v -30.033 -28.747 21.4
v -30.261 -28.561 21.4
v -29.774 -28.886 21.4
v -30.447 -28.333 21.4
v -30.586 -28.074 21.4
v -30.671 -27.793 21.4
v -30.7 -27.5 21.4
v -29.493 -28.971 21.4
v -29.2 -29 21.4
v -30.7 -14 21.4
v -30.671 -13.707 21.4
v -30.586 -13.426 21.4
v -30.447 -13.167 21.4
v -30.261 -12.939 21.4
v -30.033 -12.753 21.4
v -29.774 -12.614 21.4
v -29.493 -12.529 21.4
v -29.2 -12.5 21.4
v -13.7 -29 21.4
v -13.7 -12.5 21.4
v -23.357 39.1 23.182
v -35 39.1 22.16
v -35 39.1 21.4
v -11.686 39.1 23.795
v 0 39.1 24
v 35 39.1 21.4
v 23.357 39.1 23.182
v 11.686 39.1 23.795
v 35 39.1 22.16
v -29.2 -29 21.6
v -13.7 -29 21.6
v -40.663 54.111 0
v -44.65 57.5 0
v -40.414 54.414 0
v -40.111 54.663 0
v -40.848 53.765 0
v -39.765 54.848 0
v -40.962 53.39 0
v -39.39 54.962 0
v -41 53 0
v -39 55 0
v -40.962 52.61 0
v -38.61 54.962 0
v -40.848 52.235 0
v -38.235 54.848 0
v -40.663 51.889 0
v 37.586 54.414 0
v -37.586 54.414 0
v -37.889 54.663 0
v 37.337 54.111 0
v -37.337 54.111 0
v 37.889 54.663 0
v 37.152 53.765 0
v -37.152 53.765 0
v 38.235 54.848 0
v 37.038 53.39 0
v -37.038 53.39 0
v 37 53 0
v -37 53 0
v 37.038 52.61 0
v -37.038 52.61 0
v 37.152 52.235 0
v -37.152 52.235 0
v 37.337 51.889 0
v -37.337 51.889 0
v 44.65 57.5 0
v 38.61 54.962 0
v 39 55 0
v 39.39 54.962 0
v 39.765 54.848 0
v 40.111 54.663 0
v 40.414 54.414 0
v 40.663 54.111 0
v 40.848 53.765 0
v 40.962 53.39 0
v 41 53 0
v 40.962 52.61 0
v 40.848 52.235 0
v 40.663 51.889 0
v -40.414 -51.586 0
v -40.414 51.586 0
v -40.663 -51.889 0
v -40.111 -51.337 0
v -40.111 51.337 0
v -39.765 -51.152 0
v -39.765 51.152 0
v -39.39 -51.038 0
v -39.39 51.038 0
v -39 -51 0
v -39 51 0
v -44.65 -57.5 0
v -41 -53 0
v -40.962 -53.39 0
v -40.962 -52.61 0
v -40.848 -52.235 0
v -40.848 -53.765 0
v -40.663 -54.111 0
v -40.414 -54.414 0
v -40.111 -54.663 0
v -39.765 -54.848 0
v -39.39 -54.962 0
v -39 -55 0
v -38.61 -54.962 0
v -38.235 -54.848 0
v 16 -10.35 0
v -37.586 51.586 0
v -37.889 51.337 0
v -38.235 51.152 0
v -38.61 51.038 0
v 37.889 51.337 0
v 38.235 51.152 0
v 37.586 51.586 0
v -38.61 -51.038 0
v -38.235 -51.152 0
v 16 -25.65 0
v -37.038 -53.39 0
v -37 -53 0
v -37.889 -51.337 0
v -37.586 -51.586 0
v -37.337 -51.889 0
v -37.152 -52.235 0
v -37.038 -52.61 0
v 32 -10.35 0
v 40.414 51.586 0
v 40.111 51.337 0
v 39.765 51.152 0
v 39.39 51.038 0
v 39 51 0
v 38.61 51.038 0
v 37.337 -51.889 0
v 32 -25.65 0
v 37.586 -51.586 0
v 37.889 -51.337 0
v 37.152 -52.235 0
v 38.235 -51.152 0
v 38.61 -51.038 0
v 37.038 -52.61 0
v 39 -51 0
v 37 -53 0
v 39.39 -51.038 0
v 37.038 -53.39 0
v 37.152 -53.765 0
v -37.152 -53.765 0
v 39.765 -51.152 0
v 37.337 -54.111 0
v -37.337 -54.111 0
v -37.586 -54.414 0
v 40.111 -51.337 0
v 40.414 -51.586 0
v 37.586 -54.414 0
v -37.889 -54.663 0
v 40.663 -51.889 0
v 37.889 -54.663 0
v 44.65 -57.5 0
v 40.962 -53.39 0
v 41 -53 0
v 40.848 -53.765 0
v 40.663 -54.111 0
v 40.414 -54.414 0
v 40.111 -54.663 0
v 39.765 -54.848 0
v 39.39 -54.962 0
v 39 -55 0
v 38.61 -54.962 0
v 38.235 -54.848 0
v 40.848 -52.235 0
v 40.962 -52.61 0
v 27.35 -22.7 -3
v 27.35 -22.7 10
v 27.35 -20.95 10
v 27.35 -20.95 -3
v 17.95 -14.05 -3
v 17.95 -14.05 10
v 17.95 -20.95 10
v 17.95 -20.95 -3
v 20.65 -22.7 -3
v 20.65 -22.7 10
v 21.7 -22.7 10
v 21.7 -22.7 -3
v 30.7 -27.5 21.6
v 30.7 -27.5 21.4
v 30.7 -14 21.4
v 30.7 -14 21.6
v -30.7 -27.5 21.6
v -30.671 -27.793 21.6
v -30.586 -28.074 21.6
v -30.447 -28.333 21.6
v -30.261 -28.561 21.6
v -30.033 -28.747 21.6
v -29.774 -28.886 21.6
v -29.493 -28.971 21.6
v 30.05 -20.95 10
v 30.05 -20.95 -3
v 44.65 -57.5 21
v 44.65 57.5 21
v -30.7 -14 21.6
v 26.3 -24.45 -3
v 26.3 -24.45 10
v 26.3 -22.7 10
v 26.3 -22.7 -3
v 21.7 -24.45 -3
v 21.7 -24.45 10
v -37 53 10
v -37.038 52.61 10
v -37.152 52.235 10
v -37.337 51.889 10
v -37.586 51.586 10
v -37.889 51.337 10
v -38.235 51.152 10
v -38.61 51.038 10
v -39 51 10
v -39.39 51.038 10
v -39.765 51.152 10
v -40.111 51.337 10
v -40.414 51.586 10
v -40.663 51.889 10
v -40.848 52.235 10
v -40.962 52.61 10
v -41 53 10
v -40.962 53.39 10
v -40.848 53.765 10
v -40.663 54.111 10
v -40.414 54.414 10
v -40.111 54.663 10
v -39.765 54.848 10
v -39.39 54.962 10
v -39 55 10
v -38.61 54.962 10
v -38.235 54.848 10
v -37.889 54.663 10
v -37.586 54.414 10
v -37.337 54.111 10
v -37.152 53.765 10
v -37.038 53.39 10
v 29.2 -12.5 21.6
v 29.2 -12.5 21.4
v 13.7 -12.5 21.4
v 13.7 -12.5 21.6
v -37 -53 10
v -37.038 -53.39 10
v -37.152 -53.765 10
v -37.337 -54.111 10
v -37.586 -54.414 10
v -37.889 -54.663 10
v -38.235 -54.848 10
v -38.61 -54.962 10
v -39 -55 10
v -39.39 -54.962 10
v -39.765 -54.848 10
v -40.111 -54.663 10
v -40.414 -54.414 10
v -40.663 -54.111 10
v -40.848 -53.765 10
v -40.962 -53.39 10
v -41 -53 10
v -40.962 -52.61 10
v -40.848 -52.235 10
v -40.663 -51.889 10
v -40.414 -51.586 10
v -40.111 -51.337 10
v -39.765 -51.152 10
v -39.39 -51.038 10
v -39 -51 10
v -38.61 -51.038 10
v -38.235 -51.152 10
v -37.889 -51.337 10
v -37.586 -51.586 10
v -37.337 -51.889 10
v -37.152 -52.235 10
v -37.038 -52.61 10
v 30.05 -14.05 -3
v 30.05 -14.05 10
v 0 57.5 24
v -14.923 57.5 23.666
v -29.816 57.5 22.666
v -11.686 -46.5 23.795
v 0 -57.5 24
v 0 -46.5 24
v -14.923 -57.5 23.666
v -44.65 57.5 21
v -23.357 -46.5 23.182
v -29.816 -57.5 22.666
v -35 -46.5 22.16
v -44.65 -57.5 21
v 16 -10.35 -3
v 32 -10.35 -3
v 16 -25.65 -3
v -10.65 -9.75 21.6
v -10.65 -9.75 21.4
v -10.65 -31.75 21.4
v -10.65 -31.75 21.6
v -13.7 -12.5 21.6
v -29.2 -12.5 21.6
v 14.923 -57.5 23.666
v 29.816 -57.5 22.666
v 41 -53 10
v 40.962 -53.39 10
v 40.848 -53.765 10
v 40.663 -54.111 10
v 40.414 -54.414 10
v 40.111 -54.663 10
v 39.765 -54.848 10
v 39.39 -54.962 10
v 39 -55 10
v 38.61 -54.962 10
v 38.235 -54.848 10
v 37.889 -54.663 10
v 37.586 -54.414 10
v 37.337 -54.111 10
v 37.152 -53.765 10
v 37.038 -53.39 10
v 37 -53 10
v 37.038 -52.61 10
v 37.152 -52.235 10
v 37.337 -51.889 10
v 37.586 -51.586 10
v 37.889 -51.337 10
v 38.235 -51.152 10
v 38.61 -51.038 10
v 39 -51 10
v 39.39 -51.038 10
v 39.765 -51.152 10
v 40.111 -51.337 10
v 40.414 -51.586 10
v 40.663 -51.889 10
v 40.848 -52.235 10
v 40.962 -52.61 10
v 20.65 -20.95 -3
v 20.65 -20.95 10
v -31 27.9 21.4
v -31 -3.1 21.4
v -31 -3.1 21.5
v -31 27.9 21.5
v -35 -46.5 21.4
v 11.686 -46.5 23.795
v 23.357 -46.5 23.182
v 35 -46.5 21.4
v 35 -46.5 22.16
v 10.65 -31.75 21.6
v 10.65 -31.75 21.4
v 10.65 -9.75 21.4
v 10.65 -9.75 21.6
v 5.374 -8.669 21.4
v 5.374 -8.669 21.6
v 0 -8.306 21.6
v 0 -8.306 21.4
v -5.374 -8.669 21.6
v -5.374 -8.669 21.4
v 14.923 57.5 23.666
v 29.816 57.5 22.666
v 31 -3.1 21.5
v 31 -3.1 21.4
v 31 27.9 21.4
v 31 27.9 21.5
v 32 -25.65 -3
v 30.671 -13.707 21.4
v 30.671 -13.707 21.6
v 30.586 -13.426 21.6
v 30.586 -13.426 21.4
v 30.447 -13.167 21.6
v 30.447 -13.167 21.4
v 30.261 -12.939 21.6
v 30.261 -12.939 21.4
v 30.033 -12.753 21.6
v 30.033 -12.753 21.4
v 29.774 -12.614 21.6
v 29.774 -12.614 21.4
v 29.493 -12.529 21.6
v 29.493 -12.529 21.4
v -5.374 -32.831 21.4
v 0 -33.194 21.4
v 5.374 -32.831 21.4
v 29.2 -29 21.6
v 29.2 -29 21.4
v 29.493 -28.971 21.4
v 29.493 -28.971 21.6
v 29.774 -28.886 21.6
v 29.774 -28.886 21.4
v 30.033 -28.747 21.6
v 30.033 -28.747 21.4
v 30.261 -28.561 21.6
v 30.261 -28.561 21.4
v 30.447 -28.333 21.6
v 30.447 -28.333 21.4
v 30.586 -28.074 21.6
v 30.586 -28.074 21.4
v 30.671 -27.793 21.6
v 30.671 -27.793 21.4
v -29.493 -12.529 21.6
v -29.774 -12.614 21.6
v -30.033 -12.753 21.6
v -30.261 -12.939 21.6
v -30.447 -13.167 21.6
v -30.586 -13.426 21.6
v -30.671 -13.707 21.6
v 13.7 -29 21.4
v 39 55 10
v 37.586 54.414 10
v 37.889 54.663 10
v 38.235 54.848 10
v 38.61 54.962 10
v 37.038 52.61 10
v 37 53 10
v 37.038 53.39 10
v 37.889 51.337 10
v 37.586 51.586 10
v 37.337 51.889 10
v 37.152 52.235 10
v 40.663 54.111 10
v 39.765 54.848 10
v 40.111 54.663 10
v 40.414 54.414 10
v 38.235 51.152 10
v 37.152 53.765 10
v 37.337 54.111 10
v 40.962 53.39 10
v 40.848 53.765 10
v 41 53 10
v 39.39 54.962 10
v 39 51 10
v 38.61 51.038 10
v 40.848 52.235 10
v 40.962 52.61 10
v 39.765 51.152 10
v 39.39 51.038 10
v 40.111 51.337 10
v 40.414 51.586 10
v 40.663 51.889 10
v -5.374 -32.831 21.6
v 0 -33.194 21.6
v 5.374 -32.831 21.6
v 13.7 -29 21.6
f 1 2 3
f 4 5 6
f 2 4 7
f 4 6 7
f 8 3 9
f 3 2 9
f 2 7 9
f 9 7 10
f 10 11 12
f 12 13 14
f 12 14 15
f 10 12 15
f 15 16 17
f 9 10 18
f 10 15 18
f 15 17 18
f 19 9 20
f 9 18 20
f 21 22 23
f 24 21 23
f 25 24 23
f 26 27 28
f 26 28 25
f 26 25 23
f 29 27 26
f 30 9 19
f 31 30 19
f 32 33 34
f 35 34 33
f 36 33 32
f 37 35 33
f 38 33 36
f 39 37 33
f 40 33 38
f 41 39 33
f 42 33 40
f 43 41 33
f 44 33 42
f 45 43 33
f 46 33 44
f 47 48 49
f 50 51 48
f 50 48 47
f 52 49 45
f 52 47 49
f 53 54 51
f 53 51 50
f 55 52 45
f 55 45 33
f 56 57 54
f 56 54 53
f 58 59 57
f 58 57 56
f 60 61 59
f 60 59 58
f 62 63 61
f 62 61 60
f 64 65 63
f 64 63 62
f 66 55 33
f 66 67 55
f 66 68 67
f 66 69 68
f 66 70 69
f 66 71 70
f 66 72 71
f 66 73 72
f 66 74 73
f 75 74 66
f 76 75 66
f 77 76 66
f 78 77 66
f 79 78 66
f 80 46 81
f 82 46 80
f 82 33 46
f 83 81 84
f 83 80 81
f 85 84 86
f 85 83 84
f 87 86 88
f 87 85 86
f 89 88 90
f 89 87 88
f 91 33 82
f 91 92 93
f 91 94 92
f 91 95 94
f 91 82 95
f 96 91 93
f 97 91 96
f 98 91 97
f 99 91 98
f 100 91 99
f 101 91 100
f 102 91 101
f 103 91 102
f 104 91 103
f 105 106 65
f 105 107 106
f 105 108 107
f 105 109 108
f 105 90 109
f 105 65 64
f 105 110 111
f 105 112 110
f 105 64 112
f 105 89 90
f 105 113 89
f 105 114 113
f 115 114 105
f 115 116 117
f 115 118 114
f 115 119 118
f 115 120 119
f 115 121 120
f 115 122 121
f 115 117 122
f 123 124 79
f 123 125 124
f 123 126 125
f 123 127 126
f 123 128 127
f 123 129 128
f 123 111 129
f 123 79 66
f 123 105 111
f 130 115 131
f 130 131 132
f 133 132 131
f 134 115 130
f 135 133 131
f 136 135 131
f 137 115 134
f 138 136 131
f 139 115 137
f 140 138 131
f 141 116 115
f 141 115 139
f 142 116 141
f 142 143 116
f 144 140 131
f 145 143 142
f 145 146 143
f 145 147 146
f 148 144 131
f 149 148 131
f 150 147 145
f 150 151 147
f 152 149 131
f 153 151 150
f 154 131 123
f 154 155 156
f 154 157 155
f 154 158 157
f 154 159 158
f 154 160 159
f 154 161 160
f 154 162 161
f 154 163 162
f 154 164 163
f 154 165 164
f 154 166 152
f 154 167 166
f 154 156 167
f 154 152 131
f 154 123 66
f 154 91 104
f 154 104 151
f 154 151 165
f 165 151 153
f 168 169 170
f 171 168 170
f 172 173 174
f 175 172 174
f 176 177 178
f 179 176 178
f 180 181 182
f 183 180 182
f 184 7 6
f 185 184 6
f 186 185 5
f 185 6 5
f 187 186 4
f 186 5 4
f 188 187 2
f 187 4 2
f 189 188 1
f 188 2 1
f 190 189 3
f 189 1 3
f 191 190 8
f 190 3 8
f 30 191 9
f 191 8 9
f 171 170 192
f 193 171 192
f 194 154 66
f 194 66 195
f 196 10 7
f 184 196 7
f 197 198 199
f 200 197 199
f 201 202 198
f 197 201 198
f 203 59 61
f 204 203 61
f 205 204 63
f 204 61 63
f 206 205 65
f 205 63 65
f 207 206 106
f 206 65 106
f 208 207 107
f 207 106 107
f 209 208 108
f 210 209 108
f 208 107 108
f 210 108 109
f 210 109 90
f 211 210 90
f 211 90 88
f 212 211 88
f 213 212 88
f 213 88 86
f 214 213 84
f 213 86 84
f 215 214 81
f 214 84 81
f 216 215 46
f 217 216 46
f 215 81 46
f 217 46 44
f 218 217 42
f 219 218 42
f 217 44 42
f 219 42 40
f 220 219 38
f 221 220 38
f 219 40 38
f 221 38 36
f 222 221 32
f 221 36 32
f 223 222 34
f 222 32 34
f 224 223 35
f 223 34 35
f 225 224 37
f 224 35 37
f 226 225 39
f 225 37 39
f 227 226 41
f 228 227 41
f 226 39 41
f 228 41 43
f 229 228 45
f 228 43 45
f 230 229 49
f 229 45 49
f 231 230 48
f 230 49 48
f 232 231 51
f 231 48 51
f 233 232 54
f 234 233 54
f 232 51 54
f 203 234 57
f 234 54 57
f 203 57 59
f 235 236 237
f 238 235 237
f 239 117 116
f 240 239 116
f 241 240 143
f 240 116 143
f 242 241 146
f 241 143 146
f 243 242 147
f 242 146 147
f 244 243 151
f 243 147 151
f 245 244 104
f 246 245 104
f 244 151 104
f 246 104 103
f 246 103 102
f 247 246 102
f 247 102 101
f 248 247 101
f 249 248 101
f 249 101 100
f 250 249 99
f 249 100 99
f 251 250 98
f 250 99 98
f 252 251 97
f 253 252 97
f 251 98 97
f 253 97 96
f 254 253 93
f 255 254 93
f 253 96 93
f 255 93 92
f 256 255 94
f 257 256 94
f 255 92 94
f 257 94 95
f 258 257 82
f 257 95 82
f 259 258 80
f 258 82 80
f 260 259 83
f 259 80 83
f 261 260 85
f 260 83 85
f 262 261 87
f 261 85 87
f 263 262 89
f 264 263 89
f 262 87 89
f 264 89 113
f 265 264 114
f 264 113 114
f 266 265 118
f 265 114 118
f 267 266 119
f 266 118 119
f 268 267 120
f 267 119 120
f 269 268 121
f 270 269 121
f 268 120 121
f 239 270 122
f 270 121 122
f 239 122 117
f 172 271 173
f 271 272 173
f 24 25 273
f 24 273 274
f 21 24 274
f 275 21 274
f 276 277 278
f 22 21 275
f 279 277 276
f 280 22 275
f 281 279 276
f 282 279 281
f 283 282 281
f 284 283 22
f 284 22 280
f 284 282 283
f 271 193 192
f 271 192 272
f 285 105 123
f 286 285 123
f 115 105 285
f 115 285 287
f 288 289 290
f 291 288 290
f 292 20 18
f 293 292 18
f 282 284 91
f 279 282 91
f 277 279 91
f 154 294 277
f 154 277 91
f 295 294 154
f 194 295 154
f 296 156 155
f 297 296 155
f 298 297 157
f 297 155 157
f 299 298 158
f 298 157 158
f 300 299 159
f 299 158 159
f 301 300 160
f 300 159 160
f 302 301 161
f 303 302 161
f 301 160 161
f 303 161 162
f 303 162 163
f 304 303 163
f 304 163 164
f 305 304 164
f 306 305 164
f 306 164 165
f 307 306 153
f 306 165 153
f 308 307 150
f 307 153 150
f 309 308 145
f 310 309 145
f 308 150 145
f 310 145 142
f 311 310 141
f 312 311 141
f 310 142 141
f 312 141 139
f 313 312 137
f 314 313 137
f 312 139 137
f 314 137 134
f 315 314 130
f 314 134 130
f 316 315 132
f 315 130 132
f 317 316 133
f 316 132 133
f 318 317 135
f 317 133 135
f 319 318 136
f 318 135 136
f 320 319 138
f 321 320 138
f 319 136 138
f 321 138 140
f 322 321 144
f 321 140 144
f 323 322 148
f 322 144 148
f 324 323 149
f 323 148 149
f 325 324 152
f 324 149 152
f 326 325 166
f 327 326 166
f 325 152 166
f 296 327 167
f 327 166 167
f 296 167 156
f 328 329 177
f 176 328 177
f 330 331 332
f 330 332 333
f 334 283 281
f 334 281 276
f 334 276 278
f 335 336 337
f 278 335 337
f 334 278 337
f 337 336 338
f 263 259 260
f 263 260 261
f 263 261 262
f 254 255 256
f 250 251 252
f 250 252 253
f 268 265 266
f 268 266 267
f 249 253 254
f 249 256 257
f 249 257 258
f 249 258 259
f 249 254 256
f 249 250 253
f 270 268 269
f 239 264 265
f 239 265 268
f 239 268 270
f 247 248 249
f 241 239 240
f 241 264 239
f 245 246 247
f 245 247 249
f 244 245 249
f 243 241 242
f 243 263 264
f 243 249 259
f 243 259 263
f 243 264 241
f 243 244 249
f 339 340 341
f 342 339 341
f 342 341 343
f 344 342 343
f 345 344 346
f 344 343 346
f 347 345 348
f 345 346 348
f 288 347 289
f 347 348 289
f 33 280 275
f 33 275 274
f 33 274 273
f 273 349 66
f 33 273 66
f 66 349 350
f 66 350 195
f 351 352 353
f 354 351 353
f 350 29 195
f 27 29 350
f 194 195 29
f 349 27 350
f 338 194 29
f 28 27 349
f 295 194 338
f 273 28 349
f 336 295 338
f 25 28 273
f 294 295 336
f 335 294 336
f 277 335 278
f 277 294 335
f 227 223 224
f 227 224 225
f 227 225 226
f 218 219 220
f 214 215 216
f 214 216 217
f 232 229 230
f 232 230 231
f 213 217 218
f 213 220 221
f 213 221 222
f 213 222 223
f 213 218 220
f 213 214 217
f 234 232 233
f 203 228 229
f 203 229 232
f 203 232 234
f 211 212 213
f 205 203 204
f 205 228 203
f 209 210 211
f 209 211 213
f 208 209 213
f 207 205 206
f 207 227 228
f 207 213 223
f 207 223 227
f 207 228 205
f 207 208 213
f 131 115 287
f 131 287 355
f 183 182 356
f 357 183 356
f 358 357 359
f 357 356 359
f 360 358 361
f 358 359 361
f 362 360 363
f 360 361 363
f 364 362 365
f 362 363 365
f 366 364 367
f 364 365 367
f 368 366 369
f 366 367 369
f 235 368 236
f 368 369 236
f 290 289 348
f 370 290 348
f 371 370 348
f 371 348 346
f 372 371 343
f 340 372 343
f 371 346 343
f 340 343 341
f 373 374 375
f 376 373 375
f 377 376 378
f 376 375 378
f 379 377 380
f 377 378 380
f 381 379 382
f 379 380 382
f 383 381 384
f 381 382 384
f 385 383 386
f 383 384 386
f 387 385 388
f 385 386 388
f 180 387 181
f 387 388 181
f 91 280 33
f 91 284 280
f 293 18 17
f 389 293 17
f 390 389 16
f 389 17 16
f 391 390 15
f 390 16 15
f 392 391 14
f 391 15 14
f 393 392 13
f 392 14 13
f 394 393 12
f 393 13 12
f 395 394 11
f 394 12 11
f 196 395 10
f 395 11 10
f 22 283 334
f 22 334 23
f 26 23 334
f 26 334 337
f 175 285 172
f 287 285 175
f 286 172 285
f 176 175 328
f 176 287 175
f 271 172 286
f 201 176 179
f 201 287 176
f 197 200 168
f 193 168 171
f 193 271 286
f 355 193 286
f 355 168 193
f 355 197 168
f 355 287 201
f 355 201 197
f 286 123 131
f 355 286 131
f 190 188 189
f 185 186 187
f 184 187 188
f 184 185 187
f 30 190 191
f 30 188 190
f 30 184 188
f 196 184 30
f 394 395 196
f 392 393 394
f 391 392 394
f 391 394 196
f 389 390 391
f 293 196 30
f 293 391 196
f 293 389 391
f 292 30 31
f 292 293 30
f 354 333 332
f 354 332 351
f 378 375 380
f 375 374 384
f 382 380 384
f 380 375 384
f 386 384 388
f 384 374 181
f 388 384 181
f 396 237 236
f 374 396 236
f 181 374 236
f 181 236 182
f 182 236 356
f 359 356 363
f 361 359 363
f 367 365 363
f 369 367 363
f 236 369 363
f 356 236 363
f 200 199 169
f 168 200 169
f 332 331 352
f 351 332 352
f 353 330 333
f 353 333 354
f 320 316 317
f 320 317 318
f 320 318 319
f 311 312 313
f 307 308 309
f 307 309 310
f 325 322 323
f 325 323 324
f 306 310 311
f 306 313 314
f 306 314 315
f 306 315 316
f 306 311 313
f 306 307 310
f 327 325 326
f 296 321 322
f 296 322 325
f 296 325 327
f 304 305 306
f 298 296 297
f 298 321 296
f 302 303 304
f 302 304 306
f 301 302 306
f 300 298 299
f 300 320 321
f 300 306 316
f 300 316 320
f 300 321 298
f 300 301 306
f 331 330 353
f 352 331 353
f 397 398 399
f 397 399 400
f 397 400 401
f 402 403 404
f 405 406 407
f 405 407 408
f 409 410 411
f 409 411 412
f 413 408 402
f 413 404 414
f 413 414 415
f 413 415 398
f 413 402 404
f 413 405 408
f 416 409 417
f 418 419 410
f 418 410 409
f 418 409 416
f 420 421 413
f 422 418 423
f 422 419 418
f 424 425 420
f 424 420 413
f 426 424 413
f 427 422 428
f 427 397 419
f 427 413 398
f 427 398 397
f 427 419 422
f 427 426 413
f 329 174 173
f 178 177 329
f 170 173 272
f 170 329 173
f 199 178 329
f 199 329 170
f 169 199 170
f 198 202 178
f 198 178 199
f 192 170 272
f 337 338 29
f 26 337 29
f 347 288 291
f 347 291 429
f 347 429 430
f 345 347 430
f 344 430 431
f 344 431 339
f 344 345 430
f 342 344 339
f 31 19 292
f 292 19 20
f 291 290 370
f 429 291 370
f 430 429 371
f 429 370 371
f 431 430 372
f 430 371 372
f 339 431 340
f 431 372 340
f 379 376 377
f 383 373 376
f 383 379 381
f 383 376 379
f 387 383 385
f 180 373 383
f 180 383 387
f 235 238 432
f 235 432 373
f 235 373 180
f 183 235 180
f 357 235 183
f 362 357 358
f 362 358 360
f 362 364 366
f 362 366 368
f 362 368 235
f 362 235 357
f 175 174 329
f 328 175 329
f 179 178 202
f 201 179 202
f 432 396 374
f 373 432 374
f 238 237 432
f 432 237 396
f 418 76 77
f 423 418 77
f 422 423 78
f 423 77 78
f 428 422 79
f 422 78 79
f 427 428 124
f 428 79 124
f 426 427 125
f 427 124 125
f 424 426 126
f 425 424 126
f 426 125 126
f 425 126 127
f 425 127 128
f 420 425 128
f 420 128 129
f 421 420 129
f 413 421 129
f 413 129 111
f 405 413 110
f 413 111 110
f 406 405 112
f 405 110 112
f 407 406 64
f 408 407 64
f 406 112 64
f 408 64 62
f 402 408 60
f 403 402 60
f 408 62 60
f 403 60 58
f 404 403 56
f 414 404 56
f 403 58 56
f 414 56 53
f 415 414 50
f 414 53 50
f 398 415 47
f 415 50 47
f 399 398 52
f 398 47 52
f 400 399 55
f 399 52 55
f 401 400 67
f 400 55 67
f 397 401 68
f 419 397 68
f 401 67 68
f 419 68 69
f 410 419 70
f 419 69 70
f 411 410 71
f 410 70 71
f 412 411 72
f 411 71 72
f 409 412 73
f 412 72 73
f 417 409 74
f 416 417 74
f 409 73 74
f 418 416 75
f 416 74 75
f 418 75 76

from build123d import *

# Parameters (mm, degrees)
F1_DEPTH  = 57.5
F2_W      = 16
F2_H      = 15.3
F3_DEPTH  = 3
F2_R      = 2
F4_DEPTH  = 10
F6_W      = 70
F6_H      = 85.6
F7_DEPTH  = 2.6
F8_W      = 62
F8_H      = 31
F9_DEPTH  = 0.1
F10_DEPTH = 0.2


with BuildPart() as f1:
    # F0 (on Front) → F1 (new body, symmetric)
    with BuildSketch(Plane.XZ):
        with BuildLine():
            Line((-44.65, 0), (0, 0))
            Line((0, 0), (0, 24))
            ThreePointArc((0, 24), (-22.375335, 23.249155), (-44.65, 21))
            Line((-44.65, 21), (-44.65, 0))
        make_face()
        with BuildLine():
            Line((0, 24), (0, 0))
            Line((0, 0), (44.65, 0))
            Line((44.65, 0), (44.65, 21))
            ThreePointArc((44.65, 21), (22.375335, 23.249155), (0, 24))
        make_face()
    extrude(amount=F1_DEPTH, both=True)

    # F2 (on face) → F3 (join)
    with BuildSketch(Plane(origin=(0, 0, 0), x_dir=(1, 0, 0), z_dir=(0, 0, -1))):
        with Locations((24, 18)):
            Rectangle(F2_W, F2_H)
        Polygon((30.05, 14.05), (17.95, 14.05), (17.95, 20.95), (20.65, 20.95), (20.65, 22.7), (21.7, 22.7), (21.7, 24.45), (26.3, 24.45), (26.3, 22.7), (27.35, 22.7), (27.35, 20.95), (30.05, 20.95), align=None, mode=Mode.SUBTRACT)
    extrude(amount=F3_DEPTH)

    # F2 (on face) → F4 (cut)
    with BuildSketch(Plane(origin=(0, 0, 0), x_dir=(1, 0, 0), z_dir=(0, 0, -1))):
        Polygon((17.95, 20.95), (17.95, 14.05), (30.05, 14.05), (30.05, 20.95), (27.35, 20.95), (27.35, 22.7), (26.3, 22.7), (26.3, 24.45), (21.7, 24.45), (21.7, 22.7), (20.65, 22.7), (20.65, 20.95), align=None)
        with Locations((39, 53)):
            Circle(F2_R)
        with Locations((-39, 53)):
            Circle(F2_R)
        with Locations((-39, -53)):
            Circle(F2_R)
        with Locations((39, -53)):
            Circle(F2_R)
    extrude(amount=-F4_DEPTH, mode=Mode.SUBTRACT)

    # F6 (on offset) → F7 (cut)
    with BuildSketch(Plane.XY.offset(24)):
        with Locations((0, -3.7)):
            Rectangle(F6_W, F6_H)
    extrude(amount=-F7_DEPTH, mode=Mode.SUBTRACT)


with BuildPart() as f9:
    # F8 (on face) → F9 (new body)
    with BuildSketch(Plane.XY.offset(21.4)):
        with Locations((0, 12.4)):
            Rectangle(F8_W, F8_H)
    extrude(amount=F9_DEPTH)


with BuildPart() as f10:
    # F8 (on face) → F10 (new body)
    with BuildSketch(Plane.XY.offset(21.4)):
        with BuildLine():
            Line((-13.7, -12.5), (-29.2, -12.5))
            ThreePointArc((-29.2, -12.5), (-30.26066, -12.93934), (-30.7, -14))
            Line((-30.7, -14), (-30.7, -27.5))
            ThreePointArc((-30.7, -27.5), (-30.26066, -28.56066), (-29.2, -29))
            Line((-29.2, -29), (-13.7, -29))
            Line((-13.7, -29), (-13.7, -12.5))
        make_face()
        with BuildLine():
            ThreePointArc((29.2, -29), (30.26066, -28.56066), (30.7, -27.5))
            Line((30.7, -27.5), (30.7, -14))
            ThreePointArc((30.7, -14), (30.26066, -12.93934), (29.2, -12.5))
            Line((29.2, -12.5), (13.7, -12.5))
            Line((13.7, -12.5), (13.7, -29))
            Line((13.7, -29), (29.2, -29))
        make_face()
        with BuildLine():
            ThreePointArc((10.65, -9.75), (0, -8.30616), (-10.65, -9.75))
            Line((-10.65, -9.75), (-10.65, -31.75))
            ThreePointArc((-10.65, -31.75), (0, -33.19384), (10.65, -31.75))
            Line((10.65, -31.75), (10.65, -9.75))
        make_face()
    extrude(amount=F10_DEPTH)


solid = Compound([f1.part, f9.part, f10.part])
